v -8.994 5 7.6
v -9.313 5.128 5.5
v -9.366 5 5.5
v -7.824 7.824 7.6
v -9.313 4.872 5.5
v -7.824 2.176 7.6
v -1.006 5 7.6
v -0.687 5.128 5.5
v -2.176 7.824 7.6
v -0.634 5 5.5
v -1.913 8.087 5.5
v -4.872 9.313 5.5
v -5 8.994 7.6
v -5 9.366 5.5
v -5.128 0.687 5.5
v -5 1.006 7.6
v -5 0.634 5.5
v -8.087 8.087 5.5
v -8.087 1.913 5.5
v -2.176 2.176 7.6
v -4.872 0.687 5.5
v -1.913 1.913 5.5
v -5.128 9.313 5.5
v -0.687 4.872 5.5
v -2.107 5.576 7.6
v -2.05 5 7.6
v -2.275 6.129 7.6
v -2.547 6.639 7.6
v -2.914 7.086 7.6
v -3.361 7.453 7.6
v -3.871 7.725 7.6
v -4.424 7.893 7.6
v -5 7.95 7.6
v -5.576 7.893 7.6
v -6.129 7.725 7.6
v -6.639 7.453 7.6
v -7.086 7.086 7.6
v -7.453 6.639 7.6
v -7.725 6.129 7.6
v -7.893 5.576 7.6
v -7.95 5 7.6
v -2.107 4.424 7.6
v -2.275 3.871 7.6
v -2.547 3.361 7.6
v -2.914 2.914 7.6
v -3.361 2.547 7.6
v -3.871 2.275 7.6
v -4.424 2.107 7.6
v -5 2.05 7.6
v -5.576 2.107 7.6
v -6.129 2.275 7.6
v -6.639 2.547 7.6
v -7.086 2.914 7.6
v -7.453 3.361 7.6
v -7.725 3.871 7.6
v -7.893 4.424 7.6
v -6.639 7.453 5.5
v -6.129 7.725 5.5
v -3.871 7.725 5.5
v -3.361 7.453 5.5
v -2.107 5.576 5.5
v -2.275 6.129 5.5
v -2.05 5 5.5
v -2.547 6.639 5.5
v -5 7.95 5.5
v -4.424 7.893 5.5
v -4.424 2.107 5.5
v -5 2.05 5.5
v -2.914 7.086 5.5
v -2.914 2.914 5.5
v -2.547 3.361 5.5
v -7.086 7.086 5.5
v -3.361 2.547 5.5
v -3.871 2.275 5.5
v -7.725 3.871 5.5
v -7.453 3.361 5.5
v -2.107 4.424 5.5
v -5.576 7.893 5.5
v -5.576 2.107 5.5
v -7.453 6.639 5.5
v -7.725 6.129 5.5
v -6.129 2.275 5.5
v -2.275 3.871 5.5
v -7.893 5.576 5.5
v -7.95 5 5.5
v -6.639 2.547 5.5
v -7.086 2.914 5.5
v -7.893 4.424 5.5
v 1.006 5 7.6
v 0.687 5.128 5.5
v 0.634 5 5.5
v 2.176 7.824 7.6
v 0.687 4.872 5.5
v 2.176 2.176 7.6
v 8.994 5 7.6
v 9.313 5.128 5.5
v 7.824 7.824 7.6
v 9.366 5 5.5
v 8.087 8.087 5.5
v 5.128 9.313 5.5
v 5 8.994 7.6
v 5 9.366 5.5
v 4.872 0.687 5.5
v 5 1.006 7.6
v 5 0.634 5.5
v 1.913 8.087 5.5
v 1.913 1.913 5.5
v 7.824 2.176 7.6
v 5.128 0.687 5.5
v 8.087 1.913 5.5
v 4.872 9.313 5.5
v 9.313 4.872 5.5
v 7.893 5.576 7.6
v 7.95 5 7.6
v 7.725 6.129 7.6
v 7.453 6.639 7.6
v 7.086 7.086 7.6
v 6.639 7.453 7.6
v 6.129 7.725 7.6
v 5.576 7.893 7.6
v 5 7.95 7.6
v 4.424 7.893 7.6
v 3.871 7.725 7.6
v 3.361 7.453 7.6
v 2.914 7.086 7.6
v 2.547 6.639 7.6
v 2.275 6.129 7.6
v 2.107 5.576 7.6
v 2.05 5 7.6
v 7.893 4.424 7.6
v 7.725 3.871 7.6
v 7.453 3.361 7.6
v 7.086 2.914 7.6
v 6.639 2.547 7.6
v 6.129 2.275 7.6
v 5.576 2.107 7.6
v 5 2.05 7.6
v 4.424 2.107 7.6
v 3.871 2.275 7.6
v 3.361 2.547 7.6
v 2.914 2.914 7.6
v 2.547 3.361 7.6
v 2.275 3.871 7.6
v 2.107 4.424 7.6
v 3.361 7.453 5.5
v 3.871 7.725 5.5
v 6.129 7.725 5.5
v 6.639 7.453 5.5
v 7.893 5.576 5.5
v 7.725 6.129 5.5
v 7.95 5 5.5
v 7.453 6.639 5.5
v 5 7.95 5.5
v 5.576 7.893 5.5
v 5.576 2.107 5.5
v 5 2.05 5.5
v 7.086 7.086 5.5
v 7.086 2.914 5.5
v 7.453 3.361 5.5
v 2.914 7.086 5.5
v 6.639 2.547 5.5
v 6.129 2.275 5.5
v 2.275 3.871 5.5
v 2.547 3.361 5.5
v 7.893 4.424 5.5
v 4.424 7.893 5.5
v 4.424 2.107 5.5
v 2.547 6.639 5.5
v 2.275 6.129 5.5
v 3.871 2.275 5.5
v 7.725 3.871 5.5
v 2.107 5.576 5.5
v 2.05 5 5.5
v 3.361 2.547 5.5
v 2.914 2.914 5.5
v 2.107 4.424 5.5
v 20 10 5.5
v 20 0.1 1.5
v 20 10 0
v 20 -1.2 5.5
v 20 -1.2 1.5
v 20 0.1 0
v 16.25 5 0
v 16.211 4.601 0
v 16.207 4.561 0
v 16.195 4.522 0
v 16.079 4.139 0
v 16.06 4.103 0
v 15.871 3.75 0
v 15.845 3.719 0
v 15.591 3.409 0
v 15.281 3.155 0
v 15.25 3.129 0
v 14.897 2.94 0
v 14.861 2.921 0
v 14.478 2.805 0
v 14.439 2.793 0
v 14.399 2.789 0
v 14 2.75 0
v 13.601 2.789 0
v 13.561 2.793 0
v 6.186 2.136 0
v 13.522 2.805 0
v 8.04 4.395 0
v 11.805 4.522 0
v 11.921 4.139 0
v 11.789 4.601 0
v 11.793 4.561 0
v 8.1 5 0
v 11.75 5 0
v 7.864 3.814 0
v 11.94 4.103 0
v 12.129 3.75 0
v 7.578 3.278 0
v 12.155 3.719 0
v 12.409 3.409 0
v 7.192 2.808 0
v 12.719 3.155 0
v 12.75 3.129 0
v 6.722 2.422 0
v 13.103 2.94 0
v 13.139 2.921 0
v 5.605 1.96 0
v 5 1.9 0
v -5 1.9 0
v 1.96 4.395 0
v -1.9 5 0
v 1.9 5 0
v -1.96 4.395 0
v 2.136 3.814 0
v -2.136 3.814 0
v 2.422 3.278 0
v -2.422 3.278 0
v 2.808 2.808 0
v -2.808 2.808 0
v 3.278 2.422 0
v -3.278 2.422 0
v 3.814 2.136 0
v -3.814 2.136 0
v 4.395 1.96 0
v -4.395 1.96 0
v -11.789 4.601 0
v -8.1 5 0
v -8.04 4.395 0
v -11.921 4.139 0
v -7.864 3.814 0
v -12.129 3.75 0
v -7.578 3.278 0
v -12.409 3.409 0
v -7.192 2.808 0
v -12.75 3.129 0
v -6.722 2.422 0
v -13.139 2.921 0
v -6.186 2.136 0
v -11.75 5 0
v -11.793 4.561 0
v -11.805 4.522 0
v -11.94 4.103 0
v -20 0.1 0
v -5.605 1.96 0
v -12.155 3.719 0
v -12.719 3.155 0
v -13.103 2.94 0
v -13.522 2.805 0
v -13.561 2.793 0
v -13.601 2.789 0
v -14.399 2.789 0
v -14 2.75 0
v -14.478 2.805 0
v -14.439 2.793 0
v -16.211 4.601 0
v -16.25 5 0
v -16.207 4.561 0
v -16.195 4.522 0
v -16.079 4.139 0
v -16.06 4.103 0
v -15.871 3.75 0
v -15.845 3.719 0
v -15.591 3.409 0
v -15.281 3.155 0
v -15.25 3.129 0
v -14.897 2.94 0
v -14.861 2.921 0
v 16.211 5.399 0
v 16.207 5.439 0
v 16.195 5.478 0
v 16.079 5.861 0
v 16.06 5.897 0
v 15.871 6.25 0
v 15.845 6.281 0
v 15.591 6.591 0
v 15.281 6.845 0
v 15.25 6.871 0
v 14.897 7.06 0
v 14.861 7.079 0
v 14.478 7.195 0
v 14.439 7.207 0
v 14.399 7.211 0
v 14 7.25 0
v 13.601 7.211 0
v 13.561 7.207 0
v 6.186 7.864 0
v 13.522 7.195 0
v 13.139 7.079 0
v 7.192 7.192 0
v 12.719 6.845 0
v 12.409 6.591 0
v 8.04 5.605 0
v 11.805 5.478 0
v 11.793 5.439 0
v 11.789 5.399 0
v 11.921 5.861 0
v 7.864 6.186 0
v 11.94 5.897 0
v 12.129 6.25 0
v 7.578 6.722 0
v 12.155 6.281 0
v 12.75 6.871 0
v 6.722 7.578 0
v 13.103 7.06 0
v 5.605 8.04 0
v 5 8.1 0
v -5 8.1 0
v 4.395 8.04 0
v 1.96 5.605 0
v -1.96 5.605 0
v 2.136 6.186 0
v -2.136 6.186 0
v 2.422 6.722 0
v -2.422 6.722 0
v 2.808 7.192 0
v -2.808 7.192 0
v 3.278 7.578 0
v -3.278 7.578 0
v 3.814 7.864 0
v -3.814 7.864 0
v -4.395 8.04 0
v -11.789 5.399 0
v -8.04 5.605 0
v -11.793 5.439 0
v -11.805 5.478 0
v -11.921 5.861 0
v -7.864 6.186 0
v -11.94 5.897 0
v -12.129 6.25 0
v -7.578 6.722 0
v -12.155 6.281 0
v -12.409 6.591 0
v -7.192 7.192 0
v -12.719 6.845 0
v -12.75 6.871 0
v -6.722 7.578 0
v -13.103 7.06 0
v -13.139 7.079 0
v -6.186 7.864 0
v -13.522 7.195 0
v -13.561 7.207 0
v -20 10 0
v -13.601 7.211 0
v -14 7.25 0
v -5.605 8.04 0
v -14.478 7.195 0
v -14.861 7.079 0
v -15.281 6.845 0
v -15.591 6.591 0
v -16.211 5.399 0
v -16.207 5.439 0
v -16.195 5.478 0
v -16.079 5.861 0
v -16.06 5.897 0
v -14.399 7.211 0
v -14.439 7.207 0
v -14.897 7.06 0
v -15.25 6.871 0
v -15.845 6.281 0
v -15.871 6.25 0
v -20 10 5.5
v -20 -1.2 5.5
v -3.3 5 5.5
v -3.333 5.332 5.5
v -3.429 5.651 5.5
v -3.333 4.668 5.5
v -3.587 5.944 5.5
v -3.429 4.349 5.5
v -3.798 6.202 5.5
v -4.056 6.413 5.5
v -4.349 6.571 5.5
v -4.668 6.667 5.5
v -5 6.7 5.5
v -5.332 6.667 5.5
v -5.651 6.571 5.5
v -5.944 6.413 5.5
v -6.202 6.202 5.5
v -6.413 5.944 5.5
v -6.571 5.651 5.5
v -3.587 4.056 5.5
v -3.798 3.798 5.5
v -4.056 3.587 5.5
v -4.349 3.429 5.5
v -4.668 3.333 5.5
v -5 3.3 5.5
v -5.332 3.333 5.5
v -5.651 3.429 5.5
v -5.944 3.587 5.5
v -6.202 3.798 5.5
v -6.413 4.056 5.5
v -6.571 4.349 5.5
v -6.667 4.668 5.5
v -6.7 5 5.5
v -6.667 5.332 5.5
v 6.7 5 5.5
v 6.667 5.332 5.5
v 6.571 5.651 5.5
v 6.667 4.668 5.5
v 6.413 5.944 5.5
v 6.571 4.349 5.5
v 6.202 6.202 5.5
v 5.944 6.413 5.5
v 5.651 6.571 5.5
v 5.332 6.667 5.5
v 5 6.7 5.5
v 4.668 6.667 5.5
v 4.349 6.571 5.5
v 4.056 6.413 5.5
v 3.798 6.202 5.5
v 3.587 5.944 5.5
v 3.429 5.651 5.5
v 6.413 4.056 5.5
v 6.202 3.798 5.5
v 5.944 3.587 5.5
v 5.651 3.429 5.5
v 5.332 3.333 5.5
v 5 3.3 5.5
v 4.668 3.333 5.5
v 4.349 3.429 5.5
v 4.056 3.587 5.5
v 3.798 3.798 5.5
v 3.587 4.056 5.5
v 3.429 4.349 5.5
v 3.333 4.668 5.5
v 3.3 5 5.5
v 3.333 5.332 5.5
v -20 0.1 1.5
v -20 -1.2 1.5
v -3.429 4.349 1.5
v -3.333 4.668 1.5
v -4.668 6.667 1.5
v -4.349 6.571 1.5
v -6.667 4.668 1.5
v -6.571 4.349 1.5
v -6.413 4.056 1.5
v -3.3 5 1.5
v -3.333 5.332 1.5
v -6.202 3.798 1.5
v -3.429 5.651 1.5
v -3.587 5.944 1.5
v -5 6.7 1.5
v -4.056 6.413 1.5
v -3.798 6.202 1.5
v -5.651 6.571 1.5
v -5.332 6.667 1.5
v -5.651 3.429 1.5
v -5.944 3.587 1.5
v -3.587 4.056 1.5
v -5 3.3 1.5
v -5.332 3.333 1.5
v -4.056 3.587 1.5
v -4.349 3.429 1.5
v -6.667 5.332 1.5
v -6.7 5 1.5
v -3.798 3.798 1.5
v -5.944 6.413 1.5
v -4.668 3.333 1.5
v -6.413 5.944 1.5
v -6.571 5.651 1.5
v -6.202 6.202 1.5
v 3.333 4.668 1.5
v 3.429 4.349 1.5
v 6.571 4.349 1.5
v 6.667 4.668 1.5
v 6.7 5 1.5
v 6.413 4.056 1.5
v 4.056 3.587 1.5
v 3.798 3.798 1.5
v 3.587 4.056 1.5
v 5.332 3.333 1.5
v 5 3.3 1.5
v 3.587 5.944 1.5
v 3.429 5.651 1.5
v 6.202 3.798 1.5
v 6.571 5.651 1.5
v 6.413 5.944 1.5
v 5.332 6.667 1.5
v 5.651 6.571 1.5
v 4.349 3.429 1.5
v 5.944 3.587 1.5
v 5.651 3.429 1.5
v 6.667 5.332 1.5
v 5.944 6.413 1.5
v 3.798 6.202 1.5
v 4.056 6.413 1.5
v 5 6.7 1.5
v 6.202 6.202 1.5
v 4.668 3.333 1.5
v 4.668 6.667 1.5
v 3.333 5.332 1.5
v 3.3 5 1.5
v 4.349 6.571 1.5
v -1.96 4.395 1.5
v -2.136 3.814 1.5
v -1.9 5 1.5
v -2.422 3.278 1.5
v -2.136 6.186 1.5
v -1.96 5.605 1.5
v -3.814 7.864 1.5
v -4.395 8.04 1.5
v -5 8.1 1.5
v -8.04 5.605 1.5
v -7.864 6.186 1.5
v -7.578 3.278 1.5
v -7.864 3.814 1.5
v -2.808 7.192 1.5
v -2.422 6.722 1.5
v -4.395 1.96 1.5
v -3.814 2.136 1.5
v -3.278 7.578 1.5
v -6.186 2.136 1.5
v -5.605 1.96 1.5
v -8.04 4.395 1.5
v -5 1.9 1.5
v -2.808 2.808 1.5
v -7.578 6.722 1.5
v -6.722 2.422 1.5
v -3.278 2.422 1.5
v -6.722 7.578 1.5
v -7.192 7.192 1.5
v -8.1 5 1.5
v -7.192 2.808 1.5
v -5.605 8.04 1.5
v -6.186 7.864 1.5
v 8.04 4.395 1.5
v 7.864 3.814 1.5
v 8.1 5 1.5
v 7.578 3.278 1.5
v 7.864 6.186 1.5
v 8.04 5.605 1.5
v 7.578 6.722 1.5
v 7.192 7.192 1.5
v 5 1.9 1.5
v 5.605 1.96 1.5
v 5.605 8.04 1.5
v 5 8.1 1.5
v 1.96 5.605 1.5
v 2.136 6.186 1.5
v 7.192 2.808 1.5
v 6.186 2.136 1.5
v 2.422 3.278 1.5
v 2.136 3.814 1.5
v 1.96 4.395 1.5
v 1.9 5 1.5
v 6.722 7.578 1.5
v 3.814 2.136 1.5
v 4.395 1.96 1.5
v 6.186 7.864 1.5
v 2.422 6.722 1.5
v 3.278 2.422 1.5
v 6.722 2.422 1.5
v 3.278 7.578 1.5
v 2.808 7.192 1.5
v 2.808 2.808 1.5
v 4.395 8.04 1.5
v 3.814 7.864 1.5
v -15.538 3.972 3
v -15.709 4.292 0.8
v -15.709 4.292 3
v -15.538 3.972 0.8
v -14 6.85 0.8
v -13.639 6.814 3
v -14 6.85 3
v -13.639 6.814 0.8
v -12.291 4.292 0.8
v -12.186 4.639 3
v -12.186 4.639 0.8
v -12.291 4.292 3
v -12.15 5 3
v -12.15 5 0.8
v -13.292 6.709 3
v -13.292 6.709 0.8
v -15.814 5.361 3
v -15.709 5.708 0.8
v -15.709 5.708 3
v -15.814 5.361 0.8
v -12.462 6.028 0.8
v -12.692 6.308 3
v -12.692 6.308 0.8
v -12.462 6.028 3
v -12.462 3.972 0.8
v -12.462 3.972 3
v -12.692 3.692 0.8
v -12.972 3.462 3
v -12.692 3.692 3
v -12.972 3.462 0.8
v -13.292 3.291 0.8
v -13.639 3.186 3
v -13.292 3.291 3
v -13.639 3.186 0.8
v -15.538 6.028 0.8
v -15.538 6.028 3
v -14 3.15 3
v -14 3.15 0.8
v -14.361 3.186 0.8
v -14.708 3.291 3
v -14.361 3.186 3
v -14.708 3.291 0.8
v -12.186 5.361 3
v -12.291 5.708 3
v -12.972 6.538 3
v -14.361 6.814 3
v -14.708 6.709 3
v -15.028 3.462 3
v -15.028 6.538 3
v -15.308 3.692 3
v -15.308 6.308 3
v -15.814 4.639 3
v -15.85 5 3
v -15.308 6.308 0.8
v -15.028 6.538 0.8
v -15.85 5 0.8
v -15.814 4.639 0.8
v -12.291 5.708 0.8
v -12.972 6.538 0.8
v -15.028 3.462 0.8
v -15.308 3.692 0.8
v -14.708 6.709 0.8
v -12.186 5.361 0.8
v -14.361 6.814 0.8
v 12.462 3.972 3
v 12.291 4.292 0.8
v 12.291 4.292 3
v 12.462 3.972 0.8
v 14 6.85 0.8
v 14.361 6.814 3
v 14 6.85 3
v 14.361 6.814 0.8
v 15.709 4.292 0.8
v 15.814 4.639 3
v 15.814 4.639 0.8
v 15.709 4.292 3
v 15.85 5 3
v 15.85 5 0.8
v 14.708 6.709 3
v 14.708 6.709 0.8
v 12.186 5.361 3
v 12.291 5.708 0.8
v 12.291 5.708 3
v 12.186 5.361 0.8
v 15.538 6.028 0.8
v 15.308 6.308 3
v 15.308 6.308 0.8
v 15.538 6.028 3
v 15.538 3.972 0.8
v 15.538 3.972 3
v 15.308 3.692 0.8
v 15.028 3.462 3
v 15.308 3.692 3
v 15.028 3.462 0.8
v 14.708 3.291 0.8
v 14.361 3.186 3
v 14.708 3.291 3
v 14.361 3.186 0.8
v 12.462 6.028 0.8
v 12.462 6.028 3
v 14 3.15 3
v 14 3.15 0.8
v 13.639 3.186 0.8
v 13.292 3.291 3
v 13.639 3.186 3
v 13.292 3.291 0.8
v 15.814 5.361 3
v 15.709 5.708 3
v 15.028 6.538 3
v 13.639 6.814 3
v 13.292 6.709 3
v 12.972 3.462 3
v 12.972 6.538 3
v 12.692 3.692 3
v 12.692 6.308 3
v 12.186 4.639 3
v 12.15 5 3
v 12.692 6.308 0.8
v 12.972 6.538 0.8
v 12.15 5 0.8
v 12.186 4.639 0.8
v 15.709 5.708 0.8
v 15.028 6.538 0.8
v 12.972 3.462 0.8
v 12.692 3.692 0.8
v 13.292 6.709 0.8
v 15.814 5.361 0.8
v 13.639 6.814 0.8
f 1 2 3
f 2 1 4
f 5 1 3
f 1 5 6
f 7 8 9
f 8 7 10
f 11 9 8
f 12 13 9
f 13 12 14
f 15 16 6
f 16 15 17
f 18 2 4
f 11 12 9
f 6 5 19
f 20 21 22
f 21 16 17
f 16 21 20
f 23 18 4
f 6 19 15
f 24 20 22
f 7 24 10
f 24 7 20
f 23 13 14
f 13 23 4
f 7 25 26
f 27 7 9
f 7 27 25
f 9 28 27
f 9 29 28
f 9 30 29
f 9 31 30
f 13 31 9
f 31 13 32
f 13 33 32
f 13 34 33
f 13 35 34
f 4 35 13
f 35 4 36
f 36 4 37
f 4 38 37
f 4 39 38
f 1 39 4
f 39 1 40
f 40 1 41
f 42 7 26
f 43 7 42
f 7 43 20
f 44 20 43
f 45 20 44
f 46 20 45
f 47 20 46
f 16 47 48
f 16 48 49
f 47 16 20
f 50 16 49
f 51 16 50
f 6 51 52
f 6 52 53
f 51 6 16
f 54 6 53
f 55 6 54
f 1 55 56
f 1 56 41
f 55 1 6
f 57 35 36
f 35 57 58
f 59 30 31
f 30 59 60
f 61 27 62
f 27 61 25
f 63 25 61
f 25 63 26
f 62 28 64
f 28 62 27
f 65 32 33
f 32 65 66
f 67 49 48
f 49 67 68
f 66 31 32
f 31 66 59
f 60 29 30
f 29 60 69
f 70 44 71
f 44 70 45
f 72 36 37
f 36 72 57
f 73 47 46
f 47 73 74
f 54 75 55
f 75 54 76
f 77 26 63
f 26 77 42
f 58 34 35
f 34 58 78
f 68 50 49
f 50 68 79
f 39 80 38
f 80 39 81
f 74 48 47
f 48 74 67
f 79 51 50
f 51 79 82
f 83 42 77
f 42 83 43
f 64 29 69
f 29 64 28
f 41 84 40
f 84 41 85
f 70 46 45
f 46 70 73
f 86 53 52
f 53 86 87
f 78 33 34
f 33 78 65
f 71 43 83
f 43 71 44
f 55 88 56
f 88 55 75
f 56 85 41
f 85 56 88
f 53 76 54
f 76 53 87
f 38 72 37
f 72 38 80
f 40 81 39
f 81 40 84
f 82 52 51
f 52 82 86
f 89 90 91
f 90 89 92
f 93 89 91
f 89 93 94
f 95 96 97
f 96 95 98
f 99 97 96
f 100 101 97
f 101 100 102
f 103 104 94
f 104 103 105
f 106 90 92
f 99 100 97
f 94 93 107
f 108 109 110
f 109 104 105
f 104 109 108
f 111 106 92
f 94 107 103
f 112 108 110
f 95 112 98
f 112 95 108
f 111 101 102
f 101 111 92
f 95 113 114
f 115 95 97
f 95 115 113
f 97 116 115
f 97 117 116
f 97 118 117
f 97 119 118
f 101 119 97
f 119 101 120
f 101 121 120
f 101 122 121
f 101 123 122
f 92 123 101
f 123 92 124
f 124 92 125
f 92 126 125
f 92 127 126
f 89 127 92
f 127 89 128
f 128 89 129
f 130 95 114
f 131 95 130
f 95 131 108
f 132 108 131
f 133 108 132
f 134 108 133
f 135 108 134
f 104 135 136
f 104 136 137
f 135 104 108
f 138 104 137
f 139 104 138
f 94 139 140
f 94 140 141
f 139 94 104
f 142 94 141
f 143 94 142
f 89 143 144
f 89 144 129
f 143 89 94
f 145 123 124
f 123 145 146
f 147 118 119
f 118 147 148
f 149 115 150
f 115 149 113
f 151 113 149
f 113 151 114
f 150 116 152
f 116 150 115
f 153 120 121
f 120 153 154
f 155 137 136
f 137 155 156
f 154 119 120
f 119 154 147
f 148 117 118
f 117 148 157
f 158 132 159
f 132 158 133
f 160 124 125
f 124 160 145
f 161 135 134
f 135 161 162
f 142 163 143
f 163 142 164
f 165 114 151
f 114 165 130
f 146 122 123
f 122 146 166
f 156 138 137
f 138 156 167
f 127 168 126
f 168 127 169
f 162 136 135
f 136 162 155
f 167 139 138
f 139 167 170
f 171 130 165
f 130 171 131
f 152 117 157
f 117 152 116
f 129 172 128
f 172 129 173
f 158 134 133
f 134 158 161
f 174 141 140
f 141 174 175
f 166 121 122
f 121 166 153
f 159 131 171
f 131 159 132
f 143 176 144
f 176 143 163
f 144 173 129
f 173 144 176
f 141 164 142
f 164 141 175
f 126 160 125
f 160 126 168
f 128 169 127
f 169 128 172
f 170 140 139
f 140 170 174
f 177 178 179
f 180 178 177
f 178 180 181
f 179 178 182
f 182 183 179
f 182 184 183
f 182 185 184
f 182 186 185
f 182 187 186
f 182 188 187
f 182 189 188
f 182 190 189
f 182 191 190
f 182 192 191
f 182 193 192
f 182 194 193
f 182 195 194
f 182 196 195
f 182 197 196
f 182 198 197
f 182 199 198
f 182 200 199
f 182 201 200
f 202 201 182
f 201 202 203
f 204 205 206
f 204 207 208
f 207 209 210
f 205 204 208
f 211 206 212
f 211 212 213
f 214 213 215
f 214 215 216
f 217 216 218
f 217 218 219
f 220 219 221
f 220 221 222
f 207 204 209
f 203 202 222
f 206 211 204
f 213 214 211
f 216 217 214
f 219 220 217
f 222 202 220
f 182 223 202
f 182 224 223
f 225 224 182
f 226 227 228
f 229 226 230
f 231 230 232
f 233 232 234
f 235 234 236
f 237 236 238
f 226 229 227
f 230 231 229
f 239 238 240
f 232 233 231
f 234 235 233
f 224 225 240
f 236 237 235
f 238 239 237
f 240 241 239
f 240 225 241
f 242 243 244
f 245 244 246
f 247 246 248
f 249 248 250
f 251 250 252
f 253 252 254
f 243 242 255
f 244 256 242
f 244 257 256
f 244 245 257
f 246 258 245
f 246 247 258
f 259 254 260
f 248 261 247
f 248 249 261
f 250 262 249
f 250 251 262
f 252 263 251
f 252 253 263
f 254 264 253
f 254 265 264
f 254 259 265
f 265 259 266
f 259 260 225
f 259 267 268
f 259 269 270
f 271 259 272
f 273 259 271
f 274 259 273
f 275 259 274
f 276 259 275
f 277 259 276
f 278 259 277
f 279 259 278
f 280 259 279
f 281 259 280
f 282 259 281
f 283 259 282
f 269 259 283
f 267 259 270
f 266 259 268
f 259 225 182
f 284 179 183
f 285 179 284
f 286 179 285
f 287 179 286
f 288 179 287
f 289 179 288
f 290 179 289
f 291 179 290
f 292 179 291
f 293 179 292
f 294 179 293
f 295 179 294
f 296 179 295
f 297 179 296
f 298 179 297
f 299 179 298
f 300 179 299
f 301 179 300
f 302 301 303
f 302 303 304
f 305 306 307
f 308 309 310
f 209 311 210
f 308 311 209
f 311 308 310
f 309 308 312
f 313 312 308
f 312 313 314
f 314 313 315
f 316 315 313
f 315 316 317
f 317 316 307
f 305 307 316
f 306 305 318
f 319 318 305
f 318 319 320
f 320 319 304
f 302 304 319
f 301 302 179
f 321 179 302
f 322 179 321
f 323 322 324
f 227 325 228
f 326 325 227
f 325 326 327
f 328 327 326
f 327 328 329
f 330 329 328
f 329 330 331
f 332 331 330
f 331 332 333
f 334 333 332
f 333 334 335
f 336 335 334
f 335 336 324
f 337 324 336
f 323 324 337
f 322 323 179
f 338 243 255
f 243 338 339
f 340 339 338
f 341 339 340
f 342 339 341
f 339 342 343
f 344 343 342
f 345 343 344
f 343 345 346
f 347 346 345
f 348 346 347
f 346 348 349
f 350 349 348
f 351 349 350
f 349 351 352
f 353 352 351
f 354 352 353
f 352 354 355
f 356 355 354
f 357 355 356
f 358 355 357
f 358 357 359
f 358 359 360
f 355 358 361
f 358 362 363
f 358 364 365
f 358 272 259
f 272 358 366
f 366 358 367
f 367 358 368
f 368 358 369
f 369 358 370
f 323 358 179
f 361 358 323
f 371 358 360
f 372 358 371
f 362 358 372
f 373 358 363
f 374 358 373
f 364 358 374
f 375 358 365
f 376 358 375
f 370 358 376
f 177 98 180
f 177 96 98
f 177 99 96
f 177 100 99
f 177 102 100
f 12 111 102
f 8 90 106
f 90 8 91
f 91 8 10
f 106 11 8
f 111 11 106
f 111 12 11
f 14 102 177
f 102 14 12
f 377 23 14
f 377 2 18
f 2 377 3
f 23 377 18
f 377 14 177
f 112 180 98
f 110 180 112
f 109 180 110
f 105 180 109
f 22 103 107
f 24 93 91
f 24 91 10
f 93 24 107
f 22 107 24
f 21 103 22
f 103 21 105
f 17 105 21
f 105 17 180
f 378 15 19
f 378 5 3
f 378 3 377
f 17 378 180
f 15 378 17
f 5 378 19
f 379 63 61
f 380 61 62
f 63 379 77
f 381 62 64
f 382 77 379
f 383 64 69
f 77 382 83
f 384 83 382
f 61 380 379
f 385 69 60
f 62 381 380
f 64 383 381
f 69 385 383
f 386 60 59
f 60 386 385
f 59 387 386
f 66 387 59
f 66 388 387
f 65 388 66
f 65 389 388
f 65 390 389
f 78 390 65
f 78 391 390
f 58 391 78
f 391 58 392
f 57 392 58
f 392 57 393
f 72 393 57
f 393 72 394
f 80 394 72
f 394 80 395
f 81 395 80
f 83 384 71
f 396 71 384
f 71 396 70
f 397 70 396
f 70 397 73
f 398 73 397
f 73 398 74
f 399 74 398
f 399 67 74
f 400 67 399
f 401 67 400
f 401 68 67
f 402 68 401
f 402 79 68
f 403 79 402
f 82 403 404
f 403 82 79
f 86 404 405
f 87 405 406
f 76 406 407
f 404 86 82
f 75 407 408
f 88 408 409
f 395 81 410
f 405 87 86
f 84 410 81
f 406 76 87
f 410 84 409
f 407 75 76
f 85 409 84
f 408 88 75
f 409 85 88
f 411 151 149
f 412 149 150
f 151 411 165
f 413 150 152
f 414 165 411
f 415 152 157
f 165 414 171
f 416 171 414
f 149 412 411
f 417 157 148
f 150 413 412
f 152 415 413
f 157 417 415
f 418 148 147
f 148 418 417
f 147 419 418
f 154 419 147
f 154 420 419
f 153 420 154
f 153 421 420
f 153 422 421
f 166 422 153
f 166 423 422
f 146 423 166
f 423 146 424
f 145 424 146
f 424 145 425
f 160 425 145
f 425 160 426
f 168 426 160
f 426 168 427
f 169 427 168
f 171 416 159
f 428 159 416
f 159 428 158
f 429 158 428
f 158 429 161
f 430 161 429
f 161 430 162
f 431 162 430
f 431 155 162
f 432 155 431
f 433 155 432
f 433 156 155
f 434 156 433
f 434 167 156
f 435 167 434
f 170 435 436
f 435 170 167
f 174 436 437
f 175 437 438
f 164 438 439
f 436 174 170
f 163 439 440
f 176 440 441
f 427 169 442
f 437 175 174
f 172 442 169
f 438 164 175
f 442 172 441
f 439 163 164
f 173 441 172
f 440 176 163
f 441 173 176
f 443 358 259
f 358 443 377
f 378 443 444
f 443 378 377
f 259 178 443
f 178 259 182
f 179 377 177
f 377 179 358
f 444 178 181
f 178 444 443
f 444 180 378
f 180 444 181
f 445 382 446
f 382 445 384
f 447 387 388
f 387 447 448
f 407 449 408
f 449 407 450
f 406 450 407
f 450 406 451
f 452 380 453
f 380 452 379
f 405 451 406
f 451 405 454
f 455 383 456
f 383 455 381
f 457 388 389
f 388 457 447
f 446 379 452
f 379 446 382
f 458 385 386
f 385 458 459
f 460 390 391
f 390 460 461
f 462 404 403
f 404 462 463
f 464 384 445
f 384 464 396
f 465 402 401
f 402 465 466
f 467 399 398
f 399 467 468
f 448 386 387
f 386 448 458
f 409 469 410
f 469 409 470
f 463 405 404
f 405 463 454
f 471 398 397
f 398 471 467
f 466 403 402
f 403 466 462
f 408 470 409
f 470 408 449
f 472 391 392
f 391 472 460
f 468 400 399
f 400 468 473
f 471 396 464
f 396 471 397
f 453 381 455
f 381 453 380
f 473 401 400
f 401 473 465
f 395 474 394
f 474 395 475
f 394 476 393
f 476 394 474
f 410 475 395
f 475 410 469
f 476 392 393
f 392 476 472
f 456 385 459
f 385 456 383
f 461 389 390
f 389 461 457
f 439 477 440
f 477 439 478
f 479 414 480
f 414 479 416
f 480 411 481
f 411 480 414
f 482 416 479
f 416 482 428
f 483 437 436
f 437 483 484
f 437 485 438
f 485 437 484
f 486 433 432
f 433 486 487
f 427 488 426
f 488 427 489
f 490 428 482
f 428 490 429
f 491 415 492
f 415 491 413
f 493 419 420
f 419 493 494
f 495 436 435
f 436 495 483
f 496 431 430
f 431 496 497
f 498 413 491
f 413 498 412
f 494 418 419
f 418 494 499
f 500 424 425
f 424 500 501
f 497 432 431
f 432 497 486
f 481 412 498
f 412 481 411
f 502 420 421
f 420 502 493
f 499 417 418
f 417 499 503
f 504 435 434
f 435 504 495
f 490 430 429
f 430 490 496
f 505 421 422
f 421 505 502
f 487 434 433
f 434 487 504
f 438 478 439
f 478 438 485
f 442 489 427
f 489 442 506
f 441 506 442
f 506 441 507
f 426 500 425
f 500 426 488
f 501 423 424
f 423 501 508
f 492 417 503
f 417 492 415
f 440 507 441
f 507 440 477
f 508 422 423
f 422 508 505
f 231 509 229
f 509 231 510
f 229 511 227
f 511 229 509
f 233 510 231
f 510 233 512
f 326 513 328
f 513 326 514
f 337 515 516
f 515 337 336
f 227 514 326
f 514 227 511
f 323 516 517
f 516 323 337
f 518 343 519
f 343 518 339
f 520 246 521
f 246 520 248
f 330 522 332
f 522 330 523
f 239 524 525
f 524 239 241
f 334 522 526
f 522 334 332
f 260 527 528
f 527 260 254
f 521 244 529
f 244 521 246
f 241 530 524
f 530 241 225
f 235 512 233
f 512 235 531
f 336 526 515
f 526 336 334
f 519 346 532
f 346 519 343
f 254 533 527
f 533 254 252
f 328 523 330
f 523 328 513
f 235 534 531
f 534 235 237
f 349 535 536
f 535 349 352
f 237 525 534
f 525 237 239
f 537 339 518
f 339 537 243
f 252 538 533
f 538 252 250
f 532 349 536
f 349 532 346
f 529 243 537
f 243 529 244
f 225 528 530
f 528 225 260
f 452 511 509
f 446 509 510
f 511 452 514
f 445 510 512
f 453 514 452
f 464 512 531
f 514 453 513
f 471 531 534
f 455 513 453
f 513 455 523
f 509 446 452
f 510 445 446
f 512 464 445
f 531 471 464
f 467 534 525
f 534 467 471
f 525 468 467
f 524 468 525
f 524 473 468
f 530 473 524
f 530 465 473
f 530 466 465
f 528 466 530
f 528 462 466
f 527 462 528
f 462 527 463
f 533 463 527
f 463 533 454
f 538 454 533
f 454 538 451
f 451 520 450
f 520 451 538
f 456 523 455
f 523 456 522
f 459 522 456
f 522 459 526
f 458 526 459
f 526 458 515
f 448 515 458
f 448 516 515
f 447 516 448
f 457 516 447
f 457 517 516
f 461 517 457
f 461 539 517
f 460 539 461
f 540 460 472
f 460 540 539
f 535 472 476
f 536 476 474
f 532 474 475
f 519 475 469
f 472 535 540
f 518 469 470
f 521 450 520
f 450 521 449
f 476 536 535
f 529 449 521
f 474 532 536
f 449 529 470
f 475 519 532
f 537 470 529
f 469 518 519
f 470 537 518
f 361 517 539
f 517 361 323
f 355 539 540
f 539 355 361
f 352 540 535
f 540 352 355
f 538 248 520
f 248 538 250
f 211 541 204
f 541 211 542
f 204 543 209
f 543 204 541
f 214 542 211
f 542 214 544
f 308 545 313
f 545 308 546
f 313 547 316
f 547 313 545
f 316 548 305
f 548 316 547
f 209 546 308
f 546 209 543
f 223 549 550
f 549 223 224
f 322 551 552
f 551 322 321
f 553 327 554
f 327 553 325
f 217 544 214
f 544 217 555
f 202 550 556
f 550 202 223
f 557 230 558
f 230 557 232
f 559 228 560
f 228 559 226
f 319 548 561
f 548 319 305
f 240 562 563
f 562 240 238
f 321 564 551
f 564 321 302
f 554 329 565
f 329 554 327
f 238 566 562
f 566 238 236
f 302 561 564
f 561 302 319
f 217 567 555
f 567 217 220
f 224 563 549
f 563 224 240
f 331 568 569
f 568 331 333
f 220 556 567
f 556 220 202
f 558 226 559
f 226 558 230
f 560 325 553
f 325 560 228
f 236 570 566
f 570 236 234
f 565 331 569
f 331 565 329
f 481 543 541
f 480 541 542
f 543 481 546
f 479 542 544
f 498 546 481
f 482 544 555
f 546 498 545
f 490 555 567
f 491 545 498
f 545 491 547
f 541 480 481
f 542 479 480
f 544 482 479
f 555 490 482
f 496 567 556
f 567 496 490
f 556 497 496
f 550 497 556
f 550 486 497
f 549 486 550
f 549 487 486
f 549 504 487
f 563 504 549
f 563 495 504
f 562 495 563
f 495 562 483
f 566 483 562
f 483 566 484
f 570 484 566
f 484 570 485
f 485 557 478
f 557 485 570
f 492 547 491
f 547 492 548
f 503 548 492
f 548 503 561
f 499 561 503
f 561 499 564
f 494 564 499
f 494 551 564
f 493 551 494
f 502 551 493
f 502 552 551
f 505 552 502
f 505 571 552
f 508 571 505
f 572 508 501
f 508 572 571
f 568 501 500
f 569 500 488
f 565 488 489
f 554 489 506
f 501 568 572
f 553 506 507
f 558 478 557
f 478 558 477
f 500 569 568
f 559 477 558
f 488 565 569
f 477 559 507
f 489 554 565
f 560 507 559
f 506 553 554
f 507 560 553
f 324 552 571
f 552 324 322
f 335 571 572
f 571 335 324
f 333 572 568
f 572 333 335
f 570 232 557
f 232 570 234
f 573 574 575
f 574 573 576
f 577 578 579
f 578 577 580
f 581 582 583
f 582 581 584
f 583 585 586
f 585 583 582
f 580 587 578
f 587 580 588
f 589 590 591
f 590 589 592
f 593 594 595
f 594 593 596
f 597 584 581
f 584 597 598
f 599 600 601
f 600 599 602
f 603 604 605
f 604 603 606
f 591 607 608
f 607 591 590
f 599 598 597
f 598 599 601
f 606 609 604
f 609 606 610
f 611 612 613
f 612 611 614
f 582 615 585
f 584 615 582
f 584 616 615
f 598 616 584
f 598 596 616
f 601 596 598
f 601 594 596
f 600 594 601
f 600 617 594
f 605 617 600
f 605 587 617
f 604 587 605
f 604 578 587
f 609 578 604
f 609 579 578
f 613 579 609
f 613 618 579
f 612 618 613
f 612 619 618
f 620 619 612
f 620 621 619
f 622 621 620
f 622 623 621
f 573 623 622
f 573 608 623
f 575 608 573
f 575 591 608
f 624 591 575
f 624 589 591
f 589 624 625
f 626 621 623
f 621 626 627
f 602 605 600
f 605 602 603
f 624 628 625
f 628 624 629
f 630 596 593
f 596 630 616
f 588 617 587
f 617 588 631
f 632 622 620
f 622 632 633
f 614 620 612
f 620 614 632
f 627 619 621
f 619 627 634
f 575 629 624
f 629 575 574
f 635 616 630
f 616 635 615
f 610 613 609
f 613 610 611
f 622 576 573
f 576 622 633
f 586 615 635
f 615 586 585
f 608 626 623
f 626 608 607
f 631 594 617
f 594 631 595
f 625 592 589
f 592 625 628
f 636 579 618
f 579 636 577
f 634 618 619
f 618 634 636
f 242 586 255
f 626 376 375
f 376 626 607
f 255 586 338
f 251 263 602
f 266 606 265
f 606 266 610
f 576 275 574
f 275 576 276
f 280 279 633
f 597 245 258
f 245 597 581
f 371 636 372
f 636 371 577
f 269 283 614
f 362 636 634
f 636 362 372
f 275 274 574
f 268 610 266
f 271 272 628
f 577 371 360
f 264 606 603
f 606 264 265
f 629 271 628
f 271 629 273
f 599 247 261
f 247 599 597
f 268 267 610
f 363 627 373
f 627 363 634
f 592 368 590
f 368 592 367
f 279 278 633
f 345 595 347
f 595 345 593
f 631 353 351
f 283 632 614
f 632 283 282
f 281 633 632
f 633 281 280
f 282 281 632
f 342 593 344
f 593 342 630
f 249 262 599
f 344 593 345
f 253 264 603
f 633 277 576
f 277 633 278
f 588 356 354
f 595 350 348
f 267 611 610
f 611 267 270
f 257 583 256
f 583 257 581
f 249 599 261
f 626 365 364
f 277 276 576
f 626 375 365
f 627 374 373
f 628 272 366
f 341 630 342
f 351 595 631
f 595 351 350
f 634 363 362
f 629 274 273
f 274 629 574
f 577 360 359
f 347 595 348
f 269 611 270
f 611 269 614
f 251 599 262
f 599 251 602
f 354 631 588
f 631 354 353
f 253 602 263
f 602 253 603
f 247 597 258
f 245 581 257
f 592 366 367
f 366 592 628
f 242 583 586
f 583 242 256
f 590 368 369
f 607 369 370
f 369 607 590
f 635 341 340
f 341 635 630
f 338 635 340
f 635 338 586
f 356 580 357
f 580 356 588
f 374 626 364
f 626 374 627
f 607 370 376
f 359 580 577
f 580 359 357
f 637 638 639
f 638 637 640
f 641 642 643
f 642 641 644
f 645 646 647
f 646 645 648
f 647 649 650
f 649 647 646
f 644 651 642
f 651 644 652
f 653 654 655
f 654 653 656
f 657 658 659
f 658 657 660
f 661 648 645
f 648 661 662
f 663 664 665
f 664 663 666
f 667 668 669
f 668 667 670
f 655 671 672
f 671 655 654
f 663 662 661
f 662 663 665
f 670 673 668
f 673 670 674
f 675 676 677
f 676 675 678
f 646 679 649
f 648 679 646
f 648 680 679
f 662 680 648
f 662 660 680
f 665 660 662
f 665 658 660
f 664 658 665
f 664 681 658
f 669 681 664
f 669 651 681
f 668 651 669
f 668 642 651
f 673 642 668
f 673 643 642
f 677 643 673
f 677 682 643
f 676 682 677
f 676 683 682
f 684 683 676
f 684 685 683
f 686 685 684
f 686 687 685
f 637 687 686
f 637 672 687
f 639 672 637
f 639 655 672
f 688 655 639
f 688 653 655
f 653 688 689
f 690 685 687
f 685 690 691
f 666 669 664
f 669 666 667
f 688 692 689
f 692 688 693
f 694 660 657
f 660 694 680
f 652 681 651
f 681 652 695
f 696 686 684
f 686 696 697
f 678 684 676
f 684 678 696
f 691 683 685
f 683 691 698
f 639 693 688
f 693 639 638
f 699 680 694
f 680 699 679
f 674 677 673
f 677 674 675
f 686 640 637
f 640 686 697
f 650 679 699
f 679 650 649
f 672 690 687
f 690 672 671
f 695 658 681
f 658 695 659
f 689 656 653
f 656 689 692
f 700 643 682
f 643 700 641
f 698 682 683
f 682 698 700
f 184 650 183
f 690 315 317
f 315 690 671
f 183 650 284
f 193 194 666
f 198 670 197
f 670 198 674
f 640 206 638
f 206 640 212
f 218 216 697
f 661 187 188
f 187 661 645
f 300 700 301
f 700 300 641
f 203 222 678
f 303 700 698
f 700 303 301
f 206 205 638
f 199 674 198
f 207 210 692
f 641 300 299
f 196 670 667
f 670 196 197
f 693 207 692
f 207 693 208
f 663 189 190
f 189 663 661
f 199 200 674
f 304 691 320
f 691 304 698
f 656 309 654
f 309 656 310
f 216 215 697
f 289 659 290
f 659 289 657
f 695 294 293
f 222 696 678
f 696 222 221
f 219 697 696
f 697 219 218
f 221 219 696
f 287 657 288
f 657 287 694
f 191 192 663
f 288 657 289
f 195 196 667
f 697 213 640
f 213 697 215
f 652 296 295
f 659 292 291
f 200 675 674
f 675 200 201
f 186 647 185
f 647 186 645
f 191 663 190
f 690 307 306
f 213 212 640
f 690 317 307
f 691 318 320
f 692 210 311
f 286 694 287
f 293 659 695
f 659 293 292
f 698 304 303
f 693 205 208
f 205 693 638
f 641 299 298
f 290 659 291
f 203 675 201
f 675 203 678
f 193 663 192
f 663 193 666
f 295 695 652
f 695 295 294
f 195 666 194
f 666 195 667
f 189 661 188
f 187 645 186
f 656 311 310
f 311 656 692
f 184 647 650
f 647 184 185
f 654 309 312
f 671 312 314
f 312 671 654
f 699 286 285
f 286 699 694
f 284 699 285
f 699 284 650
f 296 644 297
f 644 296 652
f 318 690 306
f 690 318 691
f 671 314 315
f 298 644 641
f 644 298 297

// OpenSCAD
include <../lib/robotskin.scad>
translate([0,0,RM_CARRIER_T+RM_PJ030_PCB_T-RM_PJ030_CLAMP_PRELOAD])
  rotate([180,0,0]) ld06_pj030_clamp_base();
